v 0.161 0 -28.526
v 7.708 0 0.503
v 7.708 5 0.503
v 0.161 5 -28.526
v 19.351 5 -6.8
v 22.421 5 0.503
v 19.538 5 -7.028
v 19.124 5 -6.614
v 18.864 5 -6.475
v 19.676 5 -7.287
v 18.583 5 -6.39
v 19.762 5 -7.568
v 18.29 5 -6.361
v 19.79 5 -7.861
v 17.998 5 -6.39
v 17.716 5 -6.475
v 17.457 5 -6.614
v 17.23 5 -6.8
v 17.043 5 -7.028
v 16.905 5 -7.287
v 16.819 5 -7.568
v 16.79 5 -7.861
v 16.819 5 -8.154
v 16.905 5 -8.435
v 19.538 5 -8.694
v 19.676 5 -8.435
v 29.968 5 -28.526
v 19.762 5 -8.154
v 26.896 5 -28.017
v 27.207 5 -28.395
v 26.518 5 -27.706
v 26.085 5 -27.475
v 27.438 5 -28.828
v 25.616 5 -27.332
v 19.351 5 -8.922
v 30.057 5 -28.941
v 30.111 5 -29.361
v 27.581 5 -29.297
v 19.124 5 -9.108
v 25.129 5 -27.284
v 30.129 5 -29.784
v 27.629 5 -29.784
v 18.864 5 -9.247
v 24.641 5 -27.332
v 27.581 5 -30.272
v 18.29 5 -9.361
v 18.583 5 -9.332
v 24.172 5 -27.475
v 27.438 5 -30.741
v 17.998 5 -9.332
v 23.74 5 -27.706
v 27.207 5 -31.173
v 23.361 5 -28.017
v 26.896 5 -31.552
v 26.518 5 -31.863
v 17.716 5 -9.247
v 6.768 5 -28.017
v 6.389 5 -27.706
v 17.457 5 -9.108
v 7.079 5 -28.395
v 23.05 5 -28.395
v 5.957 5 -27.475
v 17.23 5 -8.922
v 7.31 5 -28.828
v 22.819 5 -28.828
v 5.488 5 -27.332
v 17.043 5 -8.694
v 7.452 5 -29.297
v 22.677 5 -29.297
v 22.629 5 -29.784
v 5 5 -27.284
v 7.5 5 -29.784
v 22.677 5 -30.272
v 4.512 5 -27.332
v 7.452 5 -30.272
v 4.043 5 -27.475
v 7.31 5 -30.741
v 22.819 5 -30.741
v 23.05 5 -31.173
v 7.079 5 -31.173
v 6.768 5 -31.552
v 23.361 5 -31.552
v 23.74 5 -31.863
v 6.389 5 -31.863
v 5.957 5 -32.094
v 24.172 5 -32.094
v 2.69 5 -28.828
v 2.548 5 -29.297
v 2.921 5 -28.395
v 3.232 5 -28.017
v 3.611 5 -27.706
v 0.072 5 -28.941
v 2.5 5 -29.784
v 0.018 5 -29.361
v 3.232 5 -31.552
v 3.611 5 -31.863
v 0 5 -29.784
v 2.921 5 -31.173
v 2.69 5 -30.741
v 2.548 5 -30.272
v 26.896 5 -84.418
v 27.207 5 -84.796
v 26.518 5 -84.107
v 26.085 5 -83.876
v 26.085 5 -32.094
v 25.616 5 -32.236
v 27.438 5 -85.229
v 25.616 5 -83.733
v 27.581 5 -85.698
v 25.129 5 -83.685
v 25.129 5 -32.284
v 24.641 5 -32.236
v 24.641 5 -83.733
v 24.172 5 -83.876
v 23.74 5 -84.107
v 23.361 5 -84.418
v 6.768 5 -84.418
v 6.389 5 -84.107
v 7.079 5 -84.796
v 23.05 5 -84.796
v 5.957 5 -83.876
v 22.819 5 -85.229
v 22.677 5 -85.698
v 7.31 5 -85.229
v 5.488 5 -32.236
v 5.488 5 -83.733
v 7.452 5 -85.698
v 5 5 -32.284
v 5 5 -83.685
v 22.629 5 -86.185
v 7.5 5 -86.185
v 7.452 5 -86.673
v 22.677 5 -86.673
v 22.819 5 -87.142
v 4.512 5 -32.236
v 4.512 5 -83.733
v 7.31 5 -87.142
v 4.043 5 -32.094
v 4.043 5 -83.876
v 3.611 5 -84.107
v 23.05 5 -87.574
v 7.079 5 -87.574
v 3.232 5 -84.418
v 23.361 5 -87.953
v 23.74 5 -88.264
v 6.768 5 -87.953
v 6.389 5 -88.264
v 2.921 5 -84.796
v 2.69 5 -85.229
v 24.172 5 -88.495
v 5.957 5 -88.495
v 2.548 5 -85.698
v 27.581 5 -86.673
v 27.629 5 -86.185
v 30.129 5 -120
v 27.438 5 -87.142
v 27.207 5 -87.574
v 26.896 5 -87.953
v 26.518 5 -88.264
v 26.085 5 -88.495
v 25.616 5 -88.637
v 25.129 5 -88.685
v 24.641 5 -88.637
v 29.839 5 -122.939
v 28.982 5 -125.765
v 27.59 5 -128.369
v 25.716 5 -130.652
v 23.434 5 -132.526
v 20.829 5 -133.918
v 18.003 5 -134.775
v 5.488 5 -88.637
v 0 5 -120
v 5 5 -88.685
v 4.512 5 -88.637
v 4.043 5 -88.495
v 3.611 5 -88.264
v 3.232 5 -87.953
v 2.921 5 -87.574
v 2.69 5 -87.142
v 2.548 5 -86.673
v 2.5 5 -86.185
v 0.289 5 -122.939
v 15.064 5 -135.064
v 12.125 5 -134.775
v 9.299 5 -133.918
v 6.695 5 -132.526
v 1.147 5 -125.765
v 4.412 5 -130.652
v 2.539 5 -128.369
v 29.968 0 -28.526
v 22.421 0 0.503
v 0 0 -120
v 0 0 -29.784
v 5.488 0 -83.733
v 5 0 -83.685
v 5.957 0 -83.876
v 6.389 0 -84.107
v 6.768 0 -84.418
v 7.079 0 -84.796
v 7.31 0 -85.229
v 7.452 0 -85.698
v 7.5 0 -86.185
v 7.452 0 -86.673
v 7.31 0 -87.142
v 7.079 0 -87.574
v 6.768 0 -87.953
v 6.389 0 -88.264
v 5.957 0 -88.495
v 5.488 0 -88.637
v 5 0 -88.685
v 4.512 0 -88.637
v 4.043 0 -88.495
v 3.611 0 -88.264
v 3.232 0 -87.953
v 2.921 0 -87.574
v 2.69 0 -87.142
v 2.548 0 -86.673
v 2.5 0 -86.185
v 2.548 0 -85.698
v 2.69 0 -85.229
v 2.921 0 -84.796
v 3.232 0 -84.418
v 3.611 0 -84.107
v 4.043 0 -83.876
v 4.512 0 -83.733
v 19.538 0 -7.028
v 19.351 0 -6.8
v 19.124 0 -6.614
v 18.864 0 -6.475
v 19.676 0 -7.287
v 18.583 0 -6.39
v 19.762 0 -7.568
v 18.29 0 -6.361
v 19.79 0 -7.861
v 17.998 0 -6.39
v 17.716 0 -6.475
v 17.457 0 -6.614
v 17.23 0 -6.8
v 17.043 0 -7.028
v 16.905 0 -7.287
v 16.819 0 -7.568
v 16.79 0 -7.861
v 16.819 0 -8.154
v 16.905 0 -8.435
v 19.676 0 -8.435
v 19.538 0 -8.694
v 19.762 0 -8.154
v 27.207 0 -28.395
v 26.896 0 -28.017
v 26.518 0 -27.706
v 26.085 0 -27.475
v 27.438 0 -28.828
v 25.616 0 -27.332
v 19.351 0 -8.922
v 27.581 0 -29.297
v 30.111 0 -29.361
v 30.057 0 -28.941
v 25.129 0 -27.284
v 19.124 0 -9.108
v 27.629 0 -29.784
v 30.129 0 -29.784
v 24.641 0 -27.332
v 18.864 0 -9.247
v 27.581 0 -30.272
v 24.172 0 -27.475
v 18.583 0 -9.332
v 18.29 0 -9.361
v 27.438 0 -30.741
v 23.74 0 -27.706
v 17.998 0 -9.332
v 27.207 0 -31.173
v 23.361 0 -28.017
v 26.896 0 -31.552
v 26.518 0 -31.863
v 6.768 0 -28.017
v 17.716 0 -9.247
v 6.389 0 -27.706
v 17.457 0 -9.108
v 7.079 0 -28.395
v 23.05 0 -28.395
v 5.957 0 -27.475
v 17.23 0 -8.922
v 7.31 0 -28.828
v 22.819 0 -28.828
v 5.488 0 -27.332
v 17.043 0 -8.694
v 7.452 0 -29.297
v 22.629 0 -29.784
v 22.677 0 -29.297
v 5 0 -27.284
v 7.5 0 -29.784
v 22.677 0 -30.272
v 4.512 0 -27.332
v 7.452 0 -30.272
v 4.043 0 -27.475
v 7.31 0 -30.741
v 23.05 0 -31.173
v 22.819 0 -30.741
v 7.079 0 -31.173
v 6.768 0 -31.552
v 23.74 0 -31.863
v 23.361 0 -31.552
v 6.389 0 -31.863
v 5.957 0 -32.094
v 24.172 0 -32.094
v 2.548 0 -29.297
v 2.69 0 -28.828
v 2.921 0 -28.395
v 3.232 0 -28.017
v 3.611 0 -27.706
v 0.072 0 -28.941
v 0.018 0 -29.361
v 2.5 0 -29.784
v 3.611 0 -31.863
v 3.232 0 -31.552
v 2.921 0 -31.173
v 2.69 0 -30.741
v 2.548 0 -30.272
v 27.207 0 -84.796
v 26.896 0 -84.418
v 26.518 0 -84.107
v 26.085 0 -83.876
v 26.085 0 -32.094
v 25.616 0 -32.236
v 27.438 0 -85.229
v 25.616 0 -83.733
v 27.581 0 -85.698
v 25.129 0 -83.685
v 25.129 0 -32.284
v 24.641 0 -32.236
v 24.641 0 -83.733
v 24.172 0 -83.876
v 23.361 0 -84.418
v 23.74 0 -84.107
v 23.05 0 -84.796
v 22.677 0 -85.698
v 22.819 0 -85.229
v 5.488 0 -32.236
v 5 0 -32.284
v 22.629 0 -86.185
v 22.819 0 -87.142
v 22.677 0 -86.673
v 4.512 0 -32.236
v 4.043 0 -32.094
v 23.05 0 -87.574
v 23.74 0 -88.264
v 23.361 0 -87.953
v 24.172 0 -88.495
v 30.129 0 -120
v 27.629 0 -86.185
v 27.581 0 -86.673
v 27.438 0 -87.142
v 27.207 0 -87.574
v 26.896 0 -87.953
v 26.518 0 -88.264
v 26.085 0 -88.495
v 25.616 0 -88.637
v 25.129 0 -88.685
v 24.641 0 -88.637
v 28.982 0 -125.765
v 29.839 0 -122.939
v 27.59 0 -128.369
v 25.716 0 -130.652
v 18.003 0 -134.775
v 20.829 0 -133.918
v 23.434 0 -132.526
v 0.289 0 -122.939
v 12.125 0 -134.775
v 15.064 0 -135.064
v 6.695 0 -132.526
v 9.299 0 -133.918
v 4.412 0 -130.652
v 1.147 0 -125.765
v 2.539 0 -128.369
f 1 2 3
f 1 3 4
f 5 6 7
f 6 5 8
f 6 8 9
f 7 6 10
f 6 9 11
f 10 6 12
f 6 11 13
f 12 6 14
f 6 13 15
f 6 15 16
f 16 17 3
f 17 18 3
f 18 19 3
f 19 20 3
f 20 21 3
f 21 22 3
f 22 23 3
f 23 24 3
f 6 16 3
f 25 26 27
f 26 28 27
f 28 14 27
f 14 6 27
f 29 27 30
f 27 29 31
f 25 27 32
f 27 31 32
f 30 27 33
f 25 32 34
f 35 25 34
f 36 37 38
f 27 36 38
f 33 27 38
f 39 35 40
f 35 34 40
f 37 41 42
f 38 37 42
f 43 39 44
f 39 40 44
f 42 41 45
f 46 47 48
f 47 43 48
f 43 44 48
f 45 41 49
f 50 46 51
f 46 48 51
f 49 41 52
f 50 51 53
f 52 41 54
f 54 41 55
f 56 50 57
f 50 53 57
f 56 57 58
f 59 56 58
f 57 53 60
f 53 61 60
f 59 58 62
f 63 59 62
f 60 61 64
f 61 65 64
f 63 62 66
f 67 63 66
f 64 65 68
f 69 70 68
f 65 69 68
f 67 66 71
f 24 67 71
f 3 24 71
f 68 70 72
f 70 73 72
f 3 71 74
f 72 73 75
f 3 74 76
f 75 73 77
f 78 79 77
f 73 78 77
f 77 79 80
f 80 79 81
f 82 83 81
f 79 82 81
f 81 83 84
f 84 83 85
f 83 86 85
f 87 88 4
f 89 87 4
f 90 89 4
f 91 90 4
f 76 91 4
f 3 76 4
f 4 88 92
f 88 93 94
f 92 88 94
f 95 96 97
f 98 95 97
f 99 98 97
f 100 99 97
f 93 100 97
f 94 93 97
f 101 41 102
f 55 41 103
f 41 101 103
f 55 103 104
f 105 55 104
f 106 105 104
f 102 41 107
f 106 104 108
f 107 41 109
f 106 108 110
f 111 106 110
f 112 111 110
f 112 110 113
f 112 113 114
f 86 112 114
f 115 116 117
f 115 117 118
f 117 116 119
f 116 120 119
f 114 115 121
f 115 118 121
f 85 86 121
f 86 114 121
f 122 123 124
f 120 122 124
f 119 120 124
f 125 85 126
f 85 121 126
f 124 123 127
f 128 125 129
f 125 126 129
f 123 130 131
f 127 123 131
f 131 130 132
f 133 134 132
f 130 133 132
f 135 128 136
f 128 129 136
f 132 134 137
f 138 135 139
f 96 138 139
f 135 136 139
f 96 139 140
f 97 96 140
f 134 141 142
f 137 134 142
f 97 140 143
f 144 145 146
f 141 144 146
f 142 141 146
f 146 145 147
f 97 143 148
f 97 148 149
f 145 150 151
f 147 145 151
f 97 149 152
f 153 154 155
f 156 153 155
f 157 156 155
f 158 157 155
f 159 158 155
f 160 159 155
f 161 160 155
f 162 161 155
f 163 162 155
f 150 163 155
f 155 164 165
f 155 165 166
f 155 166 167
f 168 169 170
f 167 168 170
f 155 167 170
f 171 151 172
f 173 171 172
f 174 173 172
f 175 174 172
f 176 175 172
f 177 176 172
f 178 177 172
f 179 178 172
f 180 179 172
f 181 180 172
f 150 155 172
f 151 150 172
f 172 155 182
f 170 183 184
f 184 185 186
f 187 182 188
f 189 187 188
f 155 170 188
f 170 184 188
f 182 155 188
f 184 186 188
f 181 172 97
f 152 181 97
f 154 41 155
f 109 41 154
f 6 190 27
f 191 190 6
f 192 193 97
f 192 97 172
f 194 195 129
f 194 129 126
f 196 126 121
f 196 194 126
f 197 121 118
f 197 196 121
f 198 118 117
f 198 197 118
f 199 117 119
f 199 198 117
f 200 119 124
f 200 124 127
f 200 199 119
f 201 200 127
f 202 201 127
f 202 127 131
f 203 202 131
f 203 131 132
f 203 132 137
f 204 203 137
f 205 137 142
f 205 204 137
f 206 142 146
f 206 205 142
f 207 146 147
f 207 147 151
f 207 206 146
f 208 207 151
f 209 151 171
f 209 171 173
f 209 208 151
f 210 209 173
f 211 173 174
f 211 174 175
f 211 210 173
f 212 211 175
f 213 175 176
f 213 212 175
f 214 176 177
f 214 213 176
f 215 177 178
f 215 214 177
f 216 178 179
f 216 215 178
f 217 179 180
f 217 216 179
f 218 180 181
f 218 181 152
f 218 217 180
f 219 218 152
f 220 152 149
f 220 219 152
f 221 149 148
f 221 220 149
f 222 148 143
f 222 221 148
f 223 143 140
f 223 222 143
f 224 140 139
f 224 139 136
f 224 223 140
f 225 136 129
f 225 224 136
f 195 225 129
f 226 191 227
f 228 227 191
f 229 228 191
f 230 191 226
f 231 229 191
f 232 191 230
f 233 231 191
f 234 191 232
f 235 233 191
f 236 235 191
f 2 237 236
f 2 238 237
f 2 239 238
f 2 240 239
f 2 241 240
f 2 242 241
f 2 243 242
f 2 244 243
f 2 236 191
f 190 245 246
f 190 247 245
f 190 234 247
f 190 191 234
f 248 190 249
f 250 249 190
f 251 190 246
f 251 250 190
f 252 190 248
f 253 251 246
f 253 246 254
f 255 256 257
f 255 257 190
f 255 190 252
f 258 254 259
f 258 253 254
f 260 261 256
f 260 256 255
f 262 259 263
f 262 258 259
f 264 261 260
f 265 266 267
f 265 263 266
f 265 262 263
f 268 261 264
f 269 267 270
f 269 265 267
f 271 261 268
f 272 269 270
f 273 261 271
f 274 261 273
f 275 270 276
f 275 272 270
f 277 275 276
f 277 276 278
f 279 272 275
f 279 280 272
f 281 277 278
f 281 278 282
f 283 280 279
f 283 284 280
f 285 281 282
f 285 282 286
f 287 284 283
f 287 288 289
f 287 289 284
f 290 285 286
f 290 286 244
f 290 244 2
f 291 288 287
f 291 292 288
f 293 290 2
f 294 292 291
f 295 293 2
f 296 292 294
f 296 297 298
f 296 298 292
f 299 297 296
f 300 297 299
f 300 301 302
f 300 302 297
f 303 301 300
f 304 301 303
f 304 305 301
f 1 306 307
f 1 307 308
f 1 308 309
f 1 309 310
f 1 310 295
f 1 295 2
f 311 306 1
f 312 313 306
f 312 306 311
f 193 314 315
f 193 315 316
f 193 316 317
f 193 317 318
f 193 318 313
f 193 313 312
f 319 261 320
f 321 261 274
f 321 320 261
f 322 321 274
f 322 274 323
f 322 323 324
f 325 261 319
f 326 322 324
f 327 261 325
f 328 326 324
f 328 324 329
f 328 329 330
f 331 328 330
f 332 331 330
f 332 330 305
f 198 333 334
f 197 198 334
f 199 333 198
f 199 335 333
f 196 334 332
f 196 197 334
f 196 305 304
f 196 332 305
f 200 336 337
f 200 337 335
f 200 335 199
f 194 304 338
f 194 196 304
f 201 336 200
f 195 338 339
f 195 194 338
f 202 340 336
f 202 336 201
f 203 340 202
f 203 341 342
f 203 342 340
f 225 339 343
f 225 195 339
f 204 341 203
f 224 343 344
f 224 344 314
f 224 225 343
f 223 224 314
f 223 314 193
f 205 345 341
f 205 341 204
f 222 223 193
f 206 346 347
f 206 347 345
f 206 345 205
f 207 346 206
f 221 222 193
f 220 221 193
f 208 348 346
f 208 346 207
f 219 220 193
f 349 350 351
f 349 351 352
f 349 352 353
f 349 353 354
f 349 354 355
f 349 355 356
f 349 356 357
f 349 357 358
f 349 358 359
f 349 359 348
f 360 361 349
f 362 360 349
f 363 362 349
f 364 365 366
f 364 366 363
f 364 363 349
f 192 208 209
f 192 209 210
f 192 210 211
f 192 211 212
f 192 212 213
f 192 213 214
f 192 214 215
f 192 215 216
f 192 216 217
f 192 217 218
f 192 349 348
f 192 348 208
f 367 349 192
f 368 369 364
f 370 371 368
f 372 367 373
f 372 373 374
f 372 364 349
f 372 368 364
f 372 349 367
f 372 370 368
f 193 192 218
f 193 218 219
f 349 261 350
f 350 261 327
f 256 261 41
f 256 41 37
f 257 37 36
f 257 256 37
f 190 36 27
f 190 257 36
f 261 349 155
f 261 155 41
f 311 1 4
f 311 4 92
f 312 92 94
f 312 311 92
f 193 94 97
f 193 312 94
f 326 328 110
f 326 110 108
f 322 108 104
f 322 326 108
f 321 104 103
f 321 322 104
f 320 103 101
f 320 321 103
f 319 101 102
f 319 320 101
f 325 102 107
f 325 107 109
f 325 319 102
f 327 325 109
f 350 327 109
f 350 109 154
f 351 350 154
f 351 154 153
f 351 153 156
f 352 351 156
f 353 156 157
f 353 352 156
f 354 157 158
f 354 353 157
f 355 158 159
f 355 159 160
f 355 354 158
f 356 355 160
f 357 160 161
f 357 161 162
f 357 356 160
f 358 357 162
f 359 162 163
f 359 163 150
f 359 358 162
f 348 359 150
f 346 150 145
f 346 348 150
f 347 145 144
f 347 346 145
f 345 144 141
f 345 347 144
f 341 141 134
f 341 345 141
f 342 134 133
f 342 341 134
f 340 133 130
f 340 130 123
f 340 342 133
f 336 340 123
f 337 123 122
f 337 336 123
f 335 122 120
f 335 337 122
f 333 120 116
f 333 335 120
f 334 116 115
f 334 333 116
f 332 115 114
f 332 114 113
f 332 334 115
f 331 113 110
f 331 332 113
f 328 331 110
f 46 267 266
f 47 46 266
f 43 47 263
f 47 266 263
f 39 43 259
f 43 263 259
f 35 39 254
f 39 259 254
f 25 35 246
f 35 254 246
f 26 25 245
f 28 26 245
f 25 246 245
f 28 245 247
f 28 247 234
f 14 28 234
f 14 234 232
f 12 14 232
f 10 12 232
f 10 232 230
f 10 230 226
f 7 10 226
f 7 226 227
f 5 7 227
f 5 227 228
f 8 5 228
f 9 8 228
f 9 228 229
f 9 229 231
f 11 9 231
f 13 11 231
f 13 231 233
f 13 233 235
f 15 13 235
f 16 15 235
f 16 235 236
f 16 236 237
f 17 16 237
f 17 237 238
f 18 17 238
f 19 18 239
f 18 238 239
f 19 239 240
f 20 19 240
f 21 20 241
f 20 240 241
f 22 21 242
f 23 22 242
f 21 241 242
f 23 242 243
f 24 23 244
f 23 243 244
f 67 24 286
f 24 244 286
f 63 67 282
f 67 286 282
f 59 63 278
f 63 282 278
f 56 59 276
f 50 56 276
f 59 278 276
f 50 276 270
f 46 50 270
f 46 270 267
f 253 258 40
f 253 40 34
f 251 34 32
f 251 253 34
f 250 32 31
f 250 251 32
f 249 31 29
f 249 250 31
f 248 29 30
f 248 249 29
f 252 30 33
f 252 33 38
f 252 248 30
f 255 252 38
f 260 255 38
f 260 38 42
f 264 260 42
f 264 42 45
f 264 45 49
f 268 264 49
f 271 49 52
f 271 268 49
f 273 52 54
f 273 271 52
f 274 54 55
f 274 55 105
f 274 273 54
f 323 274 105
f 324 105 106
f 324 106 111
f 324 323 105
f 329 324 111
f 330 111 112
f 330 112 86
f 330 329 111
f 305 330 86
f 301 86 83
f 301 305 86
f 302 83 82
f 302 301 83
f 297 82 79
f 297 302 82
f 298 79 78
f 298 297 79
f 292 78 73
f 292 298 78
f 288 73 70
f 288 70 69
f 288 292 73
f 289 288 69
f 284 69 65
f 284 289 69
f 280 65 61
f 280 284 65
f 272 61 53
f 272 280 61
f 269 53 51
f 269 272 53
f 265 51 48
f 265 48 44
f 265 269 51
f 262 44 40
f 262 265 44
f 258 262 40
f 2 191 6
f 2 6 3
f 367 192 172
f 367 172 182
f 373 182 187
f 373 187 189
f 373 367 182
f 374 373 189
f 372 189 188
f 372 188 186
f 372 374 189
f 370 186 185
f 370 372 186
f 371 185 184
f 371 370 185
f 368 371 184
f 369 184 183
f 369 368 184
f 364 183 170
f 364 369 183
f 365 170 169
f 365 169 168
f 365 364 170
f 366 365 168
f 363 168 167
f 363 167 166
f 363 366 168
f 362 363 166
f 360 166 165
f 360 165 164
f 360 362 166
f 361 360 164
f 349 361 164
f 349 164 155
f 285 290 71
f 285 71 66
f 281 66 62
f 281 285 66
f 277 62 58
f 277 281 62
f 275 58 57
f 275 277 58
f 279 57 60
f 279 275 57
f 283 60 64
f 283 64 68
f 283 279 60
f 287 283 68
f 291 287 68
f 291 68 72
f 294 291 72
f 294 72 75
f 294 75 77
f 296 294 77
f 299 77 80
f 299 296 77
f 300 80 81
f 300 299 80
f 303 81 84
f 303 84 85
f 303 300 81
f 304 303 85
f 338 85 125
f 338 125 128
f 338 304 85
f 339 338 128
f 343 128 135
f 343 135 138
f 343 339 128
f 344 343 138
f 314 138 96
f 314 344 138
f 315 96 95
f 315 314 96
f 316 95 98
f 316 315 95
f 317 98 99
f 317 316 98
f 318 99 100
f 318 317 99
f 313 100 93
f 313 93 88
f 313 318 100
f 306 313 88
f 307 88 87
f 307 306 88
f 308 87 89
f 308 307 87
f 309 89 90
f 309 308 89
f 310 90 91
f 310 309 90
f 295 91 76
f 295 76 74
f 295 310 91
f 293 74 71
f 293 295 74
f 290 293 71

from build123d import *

# Parameters (mm, degrees)
SKETCH1_R             = 2.5
BOSS_EXTRUDE1_DEPTH   = 5
F_3_0MM_DOWEL_HOLE3_D = 3


with BuildPart() as part:
    # Sketch1 → Boss-Extrude1 (new body)
    with BuildSketch(Plane(origin=(0, 0, 0), x_dir=(1, 0, 0), z_dir=(0, 1, 0))):
        with BuildLine():
            Line((7.707562498, -0.503207604), (0.160848404, 28.52631677))
            ThreePointArc((0.160848404, 28.52631677), (0.040375116, 29.15020566), (0, 29.784335781))
            Line((0, 29.784335781), (0, 120))
            ThreePointArc((0, 120), (15.064339362, 135.064339362), (30.128678723, 120))
            Line((30.128678723, 120), (30.128678723, 29.784335781))
            ThreePointArc((30.128678723, 29.784335781), (30.088303607, 29.15020566), (29.967830319, 28.52631677))
            Line((29.967830319, 28.52631677), (22.421116226, -0.503207604))
            Line((22.421116226, -0.503207604), (7.707562498, -0.503207604))
        make_face()
        with Locations(Location((5, 29.784335781, 0), (0, 0, 270))):
            Circle(SKETCH1_R, mode=Mode.SUBTRACT)
        with Locations(Location((25.128678723, 29.784335781, 0), (0, 0, 270))):
            Circle(SKETCH1_R, mode=Mode.SUBTRACT)
        with Locations(Location((25.128678723, 86.185297163, 0), (0, 0, 270))):
            Circle(SKETCH1_R, mode=Mode.SUBTRACT)
        with Locations(Location((5, 86.185297163, 0), (0, 0, 270))):
            Circle(SKETCH1_R, mode=Mode.SUBTRACT)
    extrude(amount=BOSS_EXTRUDE1_DEPTH)

    # Ø3.0mm Dowel Hole3 (through all)
    with Locations(Plane(origin=(18.290450711, 5, -7.860888975), x_dir=(0, 0, 1), z_dir=(0, 1, 0))):
        with Locations((0, 0)):
            Hole(F_3_0MM_DOWEL_HOLE3_D / 2)


solid = part.part
